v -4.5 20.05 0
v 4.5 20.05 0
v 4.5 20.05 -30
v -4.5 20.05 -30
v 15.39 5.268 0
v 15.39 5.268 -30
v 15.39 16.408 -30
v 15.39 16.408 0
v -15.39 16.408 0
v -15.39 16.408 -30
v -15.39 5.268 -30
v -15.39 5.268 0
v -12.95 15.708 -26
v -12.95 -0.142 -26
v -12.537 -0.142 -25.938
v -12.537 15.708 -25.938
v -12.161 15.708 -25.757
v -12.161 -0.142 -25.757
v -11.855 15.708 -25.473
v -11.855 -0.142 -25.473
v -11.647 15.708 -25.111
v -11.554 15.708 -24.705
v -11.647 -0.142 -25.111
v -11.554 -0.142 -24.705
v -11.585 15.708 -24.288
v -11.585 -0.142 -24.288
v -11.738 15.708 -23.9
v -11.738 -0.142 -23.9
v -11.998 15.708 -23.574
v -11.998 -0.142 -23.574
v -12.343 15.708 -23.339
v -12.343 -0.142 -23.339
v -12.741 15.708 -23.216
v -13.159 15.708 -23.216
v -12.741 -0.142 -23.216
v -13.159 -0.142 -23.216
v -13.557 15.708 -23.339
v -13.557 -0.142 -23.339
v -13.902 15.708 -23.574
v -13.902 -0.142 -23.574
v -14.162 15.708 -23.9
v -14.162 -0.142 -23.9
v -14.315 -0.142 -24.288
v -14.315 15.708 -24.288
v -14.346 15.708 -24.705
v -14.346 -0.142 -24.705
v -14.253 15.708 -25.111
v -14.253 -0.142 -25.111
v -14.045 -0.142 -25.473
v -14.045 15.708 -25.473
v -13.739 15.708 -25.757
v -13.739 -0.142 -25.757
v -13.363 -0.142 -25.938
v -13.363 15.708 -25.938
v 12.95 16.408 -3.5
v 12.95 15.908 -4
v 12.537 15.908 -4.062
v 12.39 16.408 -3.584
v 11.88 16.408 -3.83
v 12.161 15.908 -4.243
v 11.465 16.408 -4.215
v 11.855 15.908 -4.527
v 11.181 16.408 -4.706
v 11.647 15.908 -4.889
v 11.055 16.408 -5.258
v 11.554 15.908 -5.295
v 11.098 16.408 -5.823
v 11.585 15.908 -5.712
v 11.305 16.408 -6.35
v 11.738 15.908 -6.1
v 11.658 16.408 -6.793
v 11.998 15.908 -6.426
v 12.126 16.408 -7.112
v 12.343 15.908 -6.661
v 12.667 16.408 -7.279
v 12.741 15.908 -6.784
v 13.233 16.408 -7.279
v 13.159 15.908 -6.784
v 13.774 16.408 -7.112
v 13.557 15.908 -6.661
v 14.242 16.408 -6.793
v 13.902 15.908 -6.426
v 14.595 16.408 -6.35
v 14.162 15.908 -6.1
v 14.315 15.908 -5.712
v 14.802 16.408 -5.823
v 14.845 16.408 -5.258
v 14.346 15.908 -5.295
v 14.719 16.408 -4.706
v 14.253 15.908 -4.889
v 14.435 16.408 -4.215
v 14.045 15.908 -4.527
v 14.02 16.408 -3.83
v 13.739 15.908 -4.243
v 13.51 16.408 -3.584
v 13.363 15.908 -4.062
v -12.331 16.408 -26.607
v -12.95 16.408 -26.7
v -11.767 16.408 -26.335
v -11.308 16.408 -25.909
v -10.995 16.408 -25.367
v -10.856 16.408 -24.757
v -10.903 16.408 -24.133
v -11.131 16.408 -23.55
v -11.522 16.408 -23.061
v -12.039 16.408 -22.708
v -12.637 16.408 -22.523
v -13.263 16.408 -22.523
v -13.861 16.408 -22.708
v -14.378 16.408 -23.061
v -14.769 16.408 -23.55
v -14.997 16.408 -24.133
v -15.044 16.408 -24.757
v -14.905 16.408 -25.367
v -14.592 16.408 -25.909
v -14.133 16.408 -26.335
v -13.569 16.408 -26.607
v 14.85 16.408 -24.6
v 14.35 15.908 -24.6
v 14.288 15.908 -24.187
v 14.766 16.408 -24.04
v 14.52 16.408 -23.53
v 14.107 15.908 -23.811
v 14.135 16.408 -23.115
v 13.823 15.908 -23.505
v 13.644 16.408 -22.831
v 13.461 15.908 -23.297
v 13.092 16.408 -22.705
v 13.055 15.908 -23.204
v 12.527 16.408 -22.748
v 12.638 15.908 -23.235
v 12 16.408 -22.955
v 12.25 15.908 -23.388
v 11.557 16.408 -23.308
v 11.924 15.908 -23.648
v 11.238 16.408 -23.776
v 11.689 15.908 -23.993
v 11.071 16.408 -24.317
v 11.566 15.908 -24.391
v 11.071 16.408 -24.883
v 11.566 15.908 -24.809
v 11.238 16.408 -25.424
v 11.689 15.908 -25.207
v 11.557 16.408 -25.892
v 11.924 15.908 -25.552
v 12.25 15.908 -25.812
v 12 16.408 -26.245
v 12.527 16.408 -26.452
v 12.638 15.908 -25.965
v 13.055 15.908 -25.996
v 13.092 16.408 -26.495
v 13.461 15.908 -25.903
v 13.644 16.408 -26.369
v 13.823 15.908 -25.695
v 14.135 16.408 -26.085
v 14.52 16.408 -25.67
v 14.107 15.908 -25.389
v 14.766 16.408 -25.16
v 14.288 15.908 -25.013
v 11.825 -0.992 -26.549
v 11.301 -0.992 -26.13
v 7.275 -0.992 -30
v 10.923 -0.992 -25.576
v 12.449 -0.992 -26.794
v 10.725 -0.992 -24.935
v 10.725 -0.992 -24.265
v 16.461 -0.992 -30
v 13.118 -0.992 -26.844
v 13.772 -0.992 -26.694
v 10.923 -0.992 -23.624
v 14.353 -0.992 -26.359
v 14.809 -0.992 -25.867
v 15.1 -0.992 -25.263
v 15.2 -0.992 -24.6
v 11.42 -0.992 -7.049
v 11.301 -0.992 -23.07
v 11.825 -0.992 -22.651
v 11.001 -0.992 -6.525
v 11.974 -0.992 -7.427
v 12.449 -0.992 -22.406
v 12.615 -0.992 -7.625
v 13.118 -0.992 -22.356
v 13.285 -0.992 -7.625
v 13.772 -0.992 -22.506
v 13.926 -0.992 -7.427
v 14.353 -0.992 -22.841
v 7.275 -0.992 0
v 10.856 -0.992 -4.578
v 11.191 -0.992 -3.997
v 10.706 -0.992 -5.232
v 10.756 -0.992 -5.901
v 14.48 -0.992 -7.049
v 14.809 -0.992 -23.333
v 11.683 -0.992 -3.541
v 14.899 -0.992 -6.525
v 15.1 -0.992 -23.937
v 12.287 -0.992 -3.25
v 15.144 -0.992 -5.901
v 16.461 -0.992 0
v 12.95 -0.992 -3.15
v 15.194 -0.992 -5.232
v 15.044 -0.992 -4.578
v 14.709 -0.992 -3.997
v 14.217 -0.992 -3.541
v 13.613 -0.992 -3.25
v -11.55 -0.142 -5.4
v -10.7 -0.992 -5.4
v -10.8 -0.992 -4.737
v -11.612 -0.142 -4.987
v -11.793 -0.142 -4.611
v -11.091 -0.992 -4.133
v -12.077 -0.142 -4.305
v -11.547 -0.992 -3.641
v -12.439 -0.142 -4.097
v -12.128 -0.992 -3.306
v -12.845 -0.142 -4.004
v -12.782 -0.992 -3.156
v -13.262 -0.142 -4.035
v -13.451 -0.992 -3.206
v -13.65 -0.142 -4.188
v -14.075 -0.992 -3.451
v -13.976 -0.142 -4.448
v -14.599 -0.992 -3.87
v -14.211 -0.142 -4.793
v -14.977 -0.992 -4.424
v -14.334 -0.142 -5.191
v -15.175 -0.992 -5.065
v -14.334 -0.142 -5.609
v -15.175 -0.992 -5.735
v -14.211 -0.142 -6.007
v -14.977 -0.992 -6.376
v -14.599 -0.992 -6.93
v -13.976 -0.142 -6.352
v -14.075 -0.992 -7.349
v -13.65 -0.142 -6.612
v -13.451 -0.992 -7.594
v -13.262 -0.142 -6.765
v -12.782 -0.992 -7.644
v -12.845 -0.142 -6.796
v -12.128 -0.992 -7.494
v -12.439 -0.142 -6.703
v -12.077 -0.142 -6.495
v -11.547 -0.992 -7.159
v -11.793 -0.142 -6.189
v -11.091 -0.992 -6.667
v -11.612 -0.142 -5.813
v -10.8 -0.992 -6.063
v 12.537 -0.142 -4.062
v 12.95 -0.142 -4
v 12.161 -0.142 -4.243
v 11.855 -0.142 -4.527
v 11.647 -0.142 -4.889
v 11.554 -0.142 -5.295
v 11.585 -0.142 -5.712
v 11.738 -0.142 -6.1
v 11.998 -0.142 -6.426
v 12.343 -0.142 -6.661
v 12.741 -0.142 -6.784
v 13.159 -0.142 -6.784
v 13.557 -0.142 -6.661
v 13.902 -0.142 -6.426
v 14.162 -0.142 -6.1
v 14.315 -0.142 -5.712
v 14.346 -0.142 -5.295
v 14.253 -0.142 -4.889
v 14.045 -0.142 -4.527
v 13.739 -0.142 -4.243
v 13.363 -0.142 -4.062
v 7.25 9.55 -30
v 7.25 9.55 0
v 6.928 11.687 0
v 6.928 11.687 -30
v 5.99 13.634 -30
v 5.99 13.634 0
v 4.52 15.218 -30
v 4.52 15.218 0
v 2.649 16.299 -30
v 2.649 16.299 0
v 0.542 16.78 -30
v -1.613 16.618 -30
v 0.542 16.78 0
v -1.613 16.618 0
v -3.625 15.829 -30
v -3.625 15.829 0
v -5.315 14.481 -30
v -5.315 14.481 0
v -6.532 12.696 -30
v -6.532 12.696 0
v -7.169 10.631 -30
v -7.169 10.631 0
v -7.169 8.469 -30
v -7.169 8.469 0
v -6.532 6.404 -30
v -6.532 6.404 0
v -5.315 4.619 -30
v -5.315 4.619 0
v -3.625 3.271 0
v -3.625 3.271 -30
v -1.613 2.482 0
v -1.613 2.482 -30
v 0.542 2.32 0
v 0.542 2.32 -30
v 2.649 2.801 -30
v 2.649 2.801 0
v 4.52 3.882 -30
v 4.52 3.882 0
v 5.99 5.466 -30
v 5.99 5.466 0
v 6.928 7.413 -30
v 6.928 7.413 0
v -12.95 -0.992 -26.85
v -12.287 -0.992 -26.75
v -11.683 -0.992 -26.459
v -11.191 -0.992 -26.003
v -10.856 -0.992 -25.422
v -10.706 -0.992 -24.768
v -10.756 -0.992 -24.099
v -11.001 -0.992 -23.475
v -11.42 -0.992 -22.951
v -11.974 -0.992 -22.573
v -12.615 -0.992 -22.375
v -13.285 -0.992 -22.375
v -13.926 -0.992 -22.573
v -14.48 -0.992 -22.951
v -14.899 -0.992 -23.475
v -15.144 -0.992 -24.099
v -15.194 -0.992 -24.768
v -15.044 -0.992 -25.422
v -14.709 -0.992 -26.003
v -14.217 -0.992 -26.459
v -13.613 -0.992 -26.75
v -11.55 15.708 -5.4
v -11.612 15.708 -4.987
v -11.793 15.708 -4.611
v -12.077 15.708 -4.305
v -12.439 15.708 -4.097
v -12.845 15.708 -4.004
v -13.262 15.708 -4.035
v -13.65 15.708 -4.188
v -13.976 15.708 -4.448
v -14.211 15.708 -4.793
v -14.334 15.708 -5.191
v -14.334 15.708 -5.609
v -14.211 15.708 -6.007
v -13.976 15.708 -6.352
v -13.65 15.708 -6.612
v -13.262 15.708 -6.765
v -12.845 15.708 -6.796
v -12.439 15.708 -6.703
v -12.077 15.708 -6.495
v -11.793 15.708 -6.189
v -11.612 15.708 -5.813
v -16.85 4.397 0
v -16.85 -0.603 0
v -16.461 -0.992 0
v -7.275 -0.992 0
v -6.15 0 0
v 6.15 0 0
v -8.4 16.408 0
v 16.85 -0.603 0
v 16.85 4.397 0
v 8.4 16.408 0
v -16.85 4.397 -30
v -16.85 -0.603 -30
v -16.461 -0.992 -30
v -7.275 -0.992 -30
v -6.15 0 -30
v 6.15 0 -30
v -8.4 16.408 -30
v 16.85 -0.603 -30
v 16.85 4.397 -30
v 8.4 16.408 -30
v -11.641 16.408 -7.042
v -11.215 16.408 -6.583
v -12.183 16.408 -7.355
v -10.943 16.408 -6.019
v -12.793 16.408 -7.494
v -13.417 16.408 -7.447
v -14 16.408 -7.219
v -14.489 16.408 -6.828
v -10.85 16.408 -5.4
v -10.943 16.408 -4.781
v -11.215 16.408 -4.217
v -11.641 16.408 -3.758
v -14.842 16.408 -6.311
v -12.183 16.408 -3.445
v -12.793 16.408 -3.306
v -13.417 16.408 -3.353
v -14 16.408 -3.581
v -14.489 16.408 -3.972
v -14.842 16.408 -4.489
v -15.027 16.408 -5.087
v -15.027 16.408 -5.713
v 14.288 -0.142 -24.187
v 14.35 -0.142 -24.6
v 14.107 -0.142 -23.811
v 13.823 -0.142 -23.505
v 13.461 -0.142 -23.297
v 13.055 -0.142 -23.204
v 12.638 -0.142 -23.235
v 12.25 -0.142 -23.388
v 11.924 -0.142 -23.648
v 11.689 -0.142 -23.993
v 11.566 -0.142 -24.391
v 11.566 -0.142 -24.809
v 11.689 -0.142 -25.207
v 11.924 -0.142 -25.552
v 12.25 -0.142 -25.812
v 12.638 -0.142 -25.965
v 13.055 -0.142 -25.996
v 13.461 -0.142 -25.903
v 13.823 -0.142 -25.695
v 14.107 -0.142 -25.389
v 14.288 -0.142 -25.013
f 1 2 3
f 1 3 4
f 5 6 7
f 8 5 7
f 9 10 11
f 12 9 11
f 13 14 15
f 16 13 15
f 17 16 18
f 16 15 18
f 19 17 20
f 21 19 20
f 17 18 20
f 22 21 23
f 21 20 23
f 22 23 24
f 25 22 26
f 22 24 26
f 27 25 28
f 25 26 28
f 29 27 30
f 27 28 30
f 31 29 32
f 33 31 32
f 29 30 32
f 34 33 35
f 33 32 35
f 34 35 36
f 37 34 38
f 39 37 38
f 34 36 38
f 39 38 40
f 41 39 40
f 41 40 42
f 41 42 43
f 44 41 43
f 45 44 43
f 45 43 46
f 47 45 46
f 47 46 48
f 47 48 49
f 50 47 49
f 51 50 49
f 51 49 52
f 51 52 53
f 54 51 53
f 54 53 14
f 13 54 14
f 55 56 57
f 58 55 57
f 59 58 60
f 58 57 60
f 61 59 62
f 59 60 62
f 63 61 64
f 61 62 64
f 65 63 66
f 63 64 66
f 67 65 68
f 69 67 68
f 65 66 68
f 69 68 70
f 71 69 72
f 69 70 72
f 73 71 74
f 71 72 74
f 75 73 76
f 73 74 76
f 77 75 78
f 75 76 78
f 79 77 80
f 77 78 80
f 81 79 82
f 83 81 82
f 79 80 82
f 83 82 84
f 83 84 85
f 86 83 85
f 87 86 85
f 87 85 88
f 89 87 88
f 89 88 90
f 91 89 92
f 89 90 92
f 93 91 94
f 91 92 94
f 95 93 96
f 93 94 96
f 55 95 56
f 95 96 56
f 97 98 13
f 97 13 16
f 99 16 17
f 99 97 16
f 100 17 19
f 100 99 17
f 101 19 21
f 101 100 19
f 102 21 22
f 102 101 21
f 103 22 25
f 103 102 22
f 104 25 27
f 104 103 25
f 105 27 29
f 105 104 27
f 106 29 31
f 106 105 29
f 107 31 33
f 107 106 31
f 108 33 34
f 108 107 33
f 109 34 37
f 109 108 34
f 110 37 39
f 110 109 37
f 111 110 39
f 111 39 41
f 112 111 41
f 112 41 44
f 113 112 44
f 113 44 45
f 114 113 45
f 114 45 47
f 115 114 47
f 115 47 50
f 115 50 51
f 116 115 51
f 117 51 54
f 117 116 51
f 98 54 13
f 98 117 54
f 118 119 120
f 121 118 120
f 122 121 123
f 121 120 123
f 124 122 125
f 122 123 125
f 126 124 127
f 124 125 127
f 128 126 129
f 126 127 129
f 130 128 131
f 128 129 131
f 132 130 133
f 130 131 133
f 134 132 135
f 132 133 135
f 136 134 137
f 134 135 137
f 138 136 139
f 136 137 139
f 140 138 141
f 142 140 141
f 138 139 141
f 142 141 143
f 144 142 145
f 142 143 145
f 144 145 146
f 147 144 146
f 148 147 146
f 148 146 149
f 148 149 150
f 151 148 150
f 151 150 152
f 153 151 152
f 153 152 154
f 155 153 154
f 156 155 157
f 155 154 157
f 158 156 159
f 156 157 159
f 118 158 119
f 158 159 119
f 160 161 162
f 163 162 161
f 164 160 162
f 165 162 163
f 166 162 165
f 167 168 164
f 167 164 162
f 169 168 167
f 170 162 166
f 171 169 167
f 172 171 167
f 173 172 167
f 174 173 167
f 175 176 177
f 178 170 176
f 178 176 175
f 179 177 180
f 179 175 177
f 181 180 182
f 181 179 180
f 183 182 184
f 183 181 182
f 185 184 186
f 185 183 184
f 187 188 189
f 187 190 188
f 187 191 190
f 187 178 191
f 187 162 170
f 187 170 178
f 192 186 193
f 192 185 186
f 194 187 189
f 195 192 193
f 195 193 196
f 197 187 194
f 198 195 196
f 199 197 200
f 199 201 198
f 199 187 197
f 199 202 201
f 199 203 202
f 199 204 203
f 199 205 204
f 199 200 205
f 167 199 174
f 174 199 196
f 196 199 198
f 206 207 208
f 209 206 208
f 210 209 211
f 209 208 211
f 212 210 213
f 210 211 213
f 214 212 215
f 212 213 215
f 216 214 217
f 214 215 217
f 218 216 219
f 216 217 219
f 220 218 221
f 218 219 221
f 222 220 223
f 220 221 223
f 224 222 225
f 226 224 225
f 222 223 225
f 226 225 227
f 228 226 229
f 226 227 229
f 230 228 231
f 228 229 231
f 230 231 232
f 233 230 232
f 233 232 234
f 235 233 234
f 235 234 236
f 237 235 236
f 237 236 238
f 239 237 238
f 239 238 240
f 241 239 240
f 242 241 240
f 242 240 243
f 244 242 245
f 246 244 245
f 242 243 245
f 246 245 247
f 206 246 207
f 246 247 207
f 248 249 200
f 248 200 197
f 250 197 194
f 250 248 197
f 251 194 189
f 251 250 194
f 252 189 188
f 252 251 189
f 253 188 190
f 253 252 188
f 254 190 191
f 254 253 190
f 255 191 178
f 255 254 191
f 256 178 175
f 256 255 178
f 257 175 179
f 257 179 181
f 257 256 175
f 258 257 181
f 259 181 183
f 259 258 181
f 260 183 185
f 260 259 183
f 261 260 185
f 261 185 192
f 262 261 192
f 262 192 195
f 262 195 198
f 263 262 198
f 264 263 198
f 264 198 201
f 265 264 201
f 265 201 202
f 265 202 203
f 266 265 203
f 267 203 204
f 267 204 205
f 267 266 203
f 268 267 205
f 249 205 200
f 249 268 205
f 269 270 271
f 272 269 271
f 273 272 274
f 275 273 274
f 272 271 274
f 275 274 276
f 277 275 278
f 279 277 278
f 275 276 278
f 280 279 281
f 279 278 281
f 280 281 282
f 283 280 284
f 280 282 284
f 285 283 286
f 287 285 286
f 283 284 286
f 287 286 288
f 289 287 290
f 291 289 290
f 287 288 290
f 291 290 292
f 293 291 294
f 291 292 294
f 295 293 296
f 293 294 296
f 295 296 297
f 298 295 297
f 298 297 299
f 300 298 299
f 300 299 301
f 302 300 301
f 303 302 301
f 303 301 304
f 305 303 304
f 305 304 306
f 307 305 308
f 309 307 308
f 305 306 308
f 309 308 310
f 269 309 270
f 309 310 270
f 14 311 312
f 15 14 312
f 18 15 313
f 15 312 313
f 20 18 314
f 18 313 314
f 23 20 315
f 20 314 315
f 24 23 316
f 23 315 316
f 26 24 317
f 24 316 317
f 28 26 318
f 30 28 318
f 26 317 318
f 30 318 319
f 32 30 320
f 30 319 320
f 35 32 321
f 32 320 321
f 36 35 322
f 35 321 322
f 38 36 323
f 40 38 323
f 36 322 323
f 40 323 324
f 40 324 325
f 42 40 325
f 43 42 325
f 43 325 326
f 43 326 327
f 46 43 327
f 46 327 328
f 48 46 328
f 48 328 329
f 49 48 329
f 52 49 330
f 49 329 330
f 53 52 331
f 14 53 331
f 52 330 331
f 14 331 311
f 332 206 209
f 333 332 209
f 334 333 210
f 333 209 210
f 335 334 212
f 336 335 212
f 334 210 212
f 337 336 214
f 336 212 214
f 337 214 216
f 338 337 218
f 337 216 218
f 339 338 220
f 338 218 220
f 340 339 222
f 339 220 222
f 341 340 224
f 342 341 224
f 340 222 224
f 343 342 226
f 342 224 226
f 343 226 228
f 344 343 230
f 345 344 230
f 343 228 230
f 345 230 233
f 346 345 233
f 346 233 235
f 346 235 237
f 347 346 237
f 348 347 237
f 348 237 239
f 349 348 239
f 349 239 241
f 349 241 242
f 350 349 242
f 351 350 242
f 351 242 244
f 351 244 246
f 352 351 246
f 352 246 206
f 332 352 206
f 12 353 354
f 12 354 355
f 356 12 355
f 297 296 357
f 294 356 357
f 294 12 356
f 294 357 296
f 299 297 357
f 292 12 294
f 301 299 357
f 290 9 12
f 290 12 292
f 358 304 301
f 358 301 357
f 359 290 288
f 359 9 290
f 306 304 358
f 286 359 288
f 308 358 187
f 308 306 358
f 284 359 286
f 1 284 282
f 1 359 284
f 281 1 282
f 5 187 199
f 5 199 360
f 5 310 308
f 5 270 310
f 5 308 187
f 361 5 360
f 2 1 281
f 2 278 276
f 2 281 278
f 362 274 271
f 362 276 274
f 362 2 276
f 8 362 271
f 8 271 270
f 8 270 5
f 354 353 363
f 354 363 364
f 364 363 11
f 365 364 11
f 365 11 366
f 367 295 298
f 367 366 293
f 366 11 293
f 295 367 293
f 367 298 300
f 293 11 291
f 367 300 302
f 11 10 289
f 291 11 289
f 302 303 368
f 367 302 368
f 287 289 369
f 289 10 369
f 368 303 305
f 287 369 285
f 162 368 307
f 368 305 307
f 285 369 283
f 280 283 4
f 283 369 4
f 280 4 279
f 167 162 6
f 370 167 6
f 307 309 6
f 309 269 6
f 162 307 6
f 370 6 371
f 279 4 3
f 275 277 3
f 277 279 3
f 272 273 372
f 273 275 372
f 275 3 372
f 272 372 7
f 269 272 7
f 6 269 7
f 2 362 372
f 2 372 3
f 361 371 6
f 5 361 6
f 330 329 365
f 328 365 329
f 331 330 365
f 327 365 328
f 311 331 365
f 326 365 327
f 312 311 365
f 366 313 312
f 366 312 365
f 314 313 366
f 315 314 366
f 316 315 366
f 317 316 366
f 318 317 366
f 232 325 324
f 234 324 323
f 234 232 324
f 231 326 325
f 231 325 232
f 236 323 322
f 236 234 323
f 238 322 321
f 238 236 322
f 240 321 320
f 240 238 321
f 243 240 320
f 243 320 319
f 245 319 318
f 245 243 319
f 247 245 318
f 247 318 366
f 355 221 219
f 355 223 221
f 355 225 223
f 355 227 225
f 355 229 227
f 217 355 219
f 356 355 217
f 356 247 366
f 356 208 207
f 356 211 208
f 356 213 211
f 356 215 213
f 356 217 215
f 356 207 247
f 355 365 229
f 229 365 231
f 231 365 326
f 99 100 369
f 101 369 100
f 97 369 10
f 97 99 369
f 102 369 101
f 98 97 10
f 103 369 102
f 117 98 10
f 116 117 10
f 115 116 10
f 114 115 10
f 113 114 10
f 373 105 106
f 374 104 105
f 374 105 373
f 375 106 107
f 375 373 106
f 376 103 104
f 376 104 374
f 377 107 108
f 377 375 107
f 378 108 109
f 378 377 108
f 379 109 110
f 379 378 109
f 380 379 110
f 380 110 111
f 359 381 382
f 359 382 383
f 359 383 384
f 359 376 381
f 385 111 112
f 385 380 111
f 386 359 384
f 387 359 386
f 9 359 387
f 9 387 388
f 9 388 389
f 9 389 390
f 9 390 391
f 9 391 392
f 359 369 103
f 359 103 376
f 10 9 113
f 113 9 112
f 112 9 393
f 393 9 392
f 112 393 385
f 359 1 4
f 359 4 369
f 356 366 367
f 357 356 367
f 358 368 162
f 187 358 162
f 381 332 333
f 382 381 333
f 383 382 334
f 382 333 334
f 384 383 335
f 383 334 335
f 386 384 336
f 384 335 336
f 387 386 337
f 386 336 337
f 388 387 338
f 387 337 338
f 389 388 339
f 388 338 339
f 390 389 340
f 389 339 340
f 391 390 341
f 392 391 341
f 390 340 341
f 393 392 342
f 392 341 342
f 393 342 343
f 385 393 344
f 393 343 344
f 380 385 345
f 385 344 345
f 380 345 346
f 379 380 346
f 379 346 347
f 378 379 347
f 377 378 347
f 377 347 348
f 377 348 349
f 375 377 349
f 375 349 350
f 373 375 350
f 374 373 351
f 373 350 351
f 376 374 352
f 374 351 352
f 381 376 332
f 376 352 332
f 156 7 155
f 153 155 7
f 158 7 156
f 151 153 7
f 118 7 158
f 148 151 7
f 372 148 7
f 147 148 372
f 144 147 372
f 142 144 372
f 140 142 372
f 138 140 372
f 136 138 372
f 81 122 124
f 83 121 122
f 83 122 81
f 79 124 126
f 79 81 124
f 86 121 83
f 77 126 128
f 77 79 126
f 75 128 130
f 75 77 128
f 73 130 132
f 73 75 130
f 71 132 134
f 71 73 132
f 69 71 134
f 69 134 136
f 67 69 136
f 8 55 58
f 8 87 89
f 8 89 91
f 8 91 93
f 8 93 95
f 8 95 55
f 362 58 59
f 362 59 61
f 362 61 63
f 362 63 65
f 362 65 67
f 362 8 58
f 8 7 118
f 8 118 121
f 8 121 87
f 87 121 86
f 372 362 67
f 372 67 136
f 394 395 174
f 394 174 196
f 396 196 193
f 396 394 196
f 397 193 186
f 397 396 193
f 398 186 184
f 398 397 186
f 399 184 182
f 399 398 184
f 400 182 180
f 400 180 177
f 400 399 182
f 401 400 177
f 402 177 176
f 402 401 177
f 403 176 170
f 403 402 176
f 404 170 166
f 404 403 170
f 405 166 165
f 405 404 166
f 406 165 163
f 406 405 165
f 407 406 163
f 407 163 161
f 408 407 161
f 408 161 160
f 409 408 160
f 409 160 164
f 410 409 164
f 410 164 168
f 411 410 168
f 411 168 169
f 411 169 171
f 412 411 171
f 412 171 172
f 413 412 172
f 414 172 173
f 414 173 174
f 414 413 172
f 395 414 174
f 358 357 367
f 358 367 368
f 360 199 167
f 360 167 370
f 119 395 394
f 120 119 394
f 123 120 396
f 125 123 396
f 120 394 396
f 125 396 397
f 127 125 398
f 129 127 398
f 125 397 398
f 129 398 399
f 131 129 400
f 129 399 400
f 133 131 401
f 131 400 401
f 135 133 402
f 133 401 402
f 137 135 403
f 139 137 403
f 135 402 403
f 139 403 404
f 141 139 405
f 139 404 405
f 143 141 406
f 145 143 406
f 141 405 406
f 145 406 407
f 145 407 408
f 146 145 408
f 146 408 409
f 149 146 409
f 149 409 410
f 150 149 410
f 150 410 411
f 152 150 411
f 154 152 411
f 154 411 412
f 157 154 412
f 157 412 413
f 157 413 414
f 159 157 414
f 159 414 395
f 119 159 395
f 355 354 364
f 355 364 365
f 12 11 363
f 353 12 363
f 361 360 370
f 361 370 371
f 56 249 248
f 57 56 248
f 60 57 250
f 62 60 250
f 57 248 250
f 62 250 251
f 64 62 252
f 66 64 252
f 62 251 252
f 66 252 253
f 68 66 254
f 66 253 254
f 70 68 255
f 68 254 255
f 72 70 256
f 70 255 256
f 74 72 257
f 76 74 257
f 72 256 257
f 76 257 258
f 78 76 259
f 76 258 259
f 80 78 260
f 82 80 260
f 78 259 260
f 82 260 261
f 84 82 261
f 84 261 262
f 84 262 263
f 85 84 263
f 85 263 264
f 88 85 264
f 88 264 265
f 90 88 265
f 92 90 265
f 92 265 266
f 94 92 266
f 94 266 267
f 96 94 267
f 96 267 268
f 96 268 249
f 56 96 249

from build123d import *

# Parameters (mm, degrees)
CROQUIS1_R              = 7.25
SALIENTE_EXTRUIR1_DEPTH = 30
CROQUIS2_R              = 1.4
CORTAR_EXTRUIR1_DEPTH   = 41.332305418
CHAFL_N2_SIZE           = 0.85
CHAFL_N3_SIZE           = 0.7
CHAFL_N4_SIZE           = 0.5


with BuildPart() as part:
    # Croquis1 → Saliente-Extruir1 (new body)
    with BuildSketch(Plane.XY):
        Polygon((-15.39, 16.407843258), (-15.39, 5.26761363), (-16.85, 4.396751988), (-16.85, -0.603248012), (-16.46109127, -0.992156742), (-7.275, -0.992156742), (-6.15, 0), (6.15, 0), (7.275, -0.992156742), (16.46109127, -0.992156742), (16.85, -0.603248012), (16.85, 4.396751988), (15.39, 5.26761363), (15.39, 16.407843258), (8.4, 16.407843258), (4.5, 20.05), (-4.5, 20.05), (-8.4, 16.407843258), align=None)
        with Locations((0, 9.55)):
            Circle(CROQUIS1_R, mode=Mode.SUBTRACT)
    extrude(amount=-SALIENTE_EXTRUIR1_DEPTH)

    # Croquis2 → Cortar-Extruir1 (cut, through all)
    with BuildSketch(Plane.XZ.offset(0.992156742)):
        with Locations((-12.95, -5.4)):
            Circle(CROQUIS2_R)
        with Locations(Location((-12.95, -24.6, 0), (0, 0, 270))):
            Circle(CROQUIS2_R)
        with Locations((12.95, -24.6)):
            Circle(CROQUIS2_R)
        with Locations(Location((12.95, -5.4, 0), (0, 0, 90))):
            Circle(CROQUIS2_R)
    extrude(amount=-CORTAR_EXTRUIR1_DEPTH, mode=Mode.SUBTRACT)

    # Chaflán2
    chafl_n2_edges = [part.edges().sort_by_distance(p)[0] for p in [
        (12.95, -0.992156742, -6.8),
        (11.55, -0.992156742, -24.6),
        (-12.95, -0.992156742, -23.2),
        (-14.35, -0.992156742, -5.4),
    ]]
    chamfer(chafl_n2_edges, length=CHAFL_N2_SIZE)

    # Chaflán3
    chafl_n3_edges = [part.edges().sort_by_distance(p)[0] for p in [
        (-12.95, 16.407843258, -23.2),
        (-14.35, 16.407843258, -5.4),
    ]]
    chamfer(chafl_n3_edges, length=CHAFL_N3_SIZE)

    # Chaflán4
    chafl_n4_edges = [part.edges().sort_by_distance(p)[0] for p in [
        (12.95, 16.407843258, -6.8),
        (11.55, 16.407843258, -24.6),
    ]]
    chamfer(chafl_n4_edges, length=CHAFL_N4_SIZE)


solid = part.part
